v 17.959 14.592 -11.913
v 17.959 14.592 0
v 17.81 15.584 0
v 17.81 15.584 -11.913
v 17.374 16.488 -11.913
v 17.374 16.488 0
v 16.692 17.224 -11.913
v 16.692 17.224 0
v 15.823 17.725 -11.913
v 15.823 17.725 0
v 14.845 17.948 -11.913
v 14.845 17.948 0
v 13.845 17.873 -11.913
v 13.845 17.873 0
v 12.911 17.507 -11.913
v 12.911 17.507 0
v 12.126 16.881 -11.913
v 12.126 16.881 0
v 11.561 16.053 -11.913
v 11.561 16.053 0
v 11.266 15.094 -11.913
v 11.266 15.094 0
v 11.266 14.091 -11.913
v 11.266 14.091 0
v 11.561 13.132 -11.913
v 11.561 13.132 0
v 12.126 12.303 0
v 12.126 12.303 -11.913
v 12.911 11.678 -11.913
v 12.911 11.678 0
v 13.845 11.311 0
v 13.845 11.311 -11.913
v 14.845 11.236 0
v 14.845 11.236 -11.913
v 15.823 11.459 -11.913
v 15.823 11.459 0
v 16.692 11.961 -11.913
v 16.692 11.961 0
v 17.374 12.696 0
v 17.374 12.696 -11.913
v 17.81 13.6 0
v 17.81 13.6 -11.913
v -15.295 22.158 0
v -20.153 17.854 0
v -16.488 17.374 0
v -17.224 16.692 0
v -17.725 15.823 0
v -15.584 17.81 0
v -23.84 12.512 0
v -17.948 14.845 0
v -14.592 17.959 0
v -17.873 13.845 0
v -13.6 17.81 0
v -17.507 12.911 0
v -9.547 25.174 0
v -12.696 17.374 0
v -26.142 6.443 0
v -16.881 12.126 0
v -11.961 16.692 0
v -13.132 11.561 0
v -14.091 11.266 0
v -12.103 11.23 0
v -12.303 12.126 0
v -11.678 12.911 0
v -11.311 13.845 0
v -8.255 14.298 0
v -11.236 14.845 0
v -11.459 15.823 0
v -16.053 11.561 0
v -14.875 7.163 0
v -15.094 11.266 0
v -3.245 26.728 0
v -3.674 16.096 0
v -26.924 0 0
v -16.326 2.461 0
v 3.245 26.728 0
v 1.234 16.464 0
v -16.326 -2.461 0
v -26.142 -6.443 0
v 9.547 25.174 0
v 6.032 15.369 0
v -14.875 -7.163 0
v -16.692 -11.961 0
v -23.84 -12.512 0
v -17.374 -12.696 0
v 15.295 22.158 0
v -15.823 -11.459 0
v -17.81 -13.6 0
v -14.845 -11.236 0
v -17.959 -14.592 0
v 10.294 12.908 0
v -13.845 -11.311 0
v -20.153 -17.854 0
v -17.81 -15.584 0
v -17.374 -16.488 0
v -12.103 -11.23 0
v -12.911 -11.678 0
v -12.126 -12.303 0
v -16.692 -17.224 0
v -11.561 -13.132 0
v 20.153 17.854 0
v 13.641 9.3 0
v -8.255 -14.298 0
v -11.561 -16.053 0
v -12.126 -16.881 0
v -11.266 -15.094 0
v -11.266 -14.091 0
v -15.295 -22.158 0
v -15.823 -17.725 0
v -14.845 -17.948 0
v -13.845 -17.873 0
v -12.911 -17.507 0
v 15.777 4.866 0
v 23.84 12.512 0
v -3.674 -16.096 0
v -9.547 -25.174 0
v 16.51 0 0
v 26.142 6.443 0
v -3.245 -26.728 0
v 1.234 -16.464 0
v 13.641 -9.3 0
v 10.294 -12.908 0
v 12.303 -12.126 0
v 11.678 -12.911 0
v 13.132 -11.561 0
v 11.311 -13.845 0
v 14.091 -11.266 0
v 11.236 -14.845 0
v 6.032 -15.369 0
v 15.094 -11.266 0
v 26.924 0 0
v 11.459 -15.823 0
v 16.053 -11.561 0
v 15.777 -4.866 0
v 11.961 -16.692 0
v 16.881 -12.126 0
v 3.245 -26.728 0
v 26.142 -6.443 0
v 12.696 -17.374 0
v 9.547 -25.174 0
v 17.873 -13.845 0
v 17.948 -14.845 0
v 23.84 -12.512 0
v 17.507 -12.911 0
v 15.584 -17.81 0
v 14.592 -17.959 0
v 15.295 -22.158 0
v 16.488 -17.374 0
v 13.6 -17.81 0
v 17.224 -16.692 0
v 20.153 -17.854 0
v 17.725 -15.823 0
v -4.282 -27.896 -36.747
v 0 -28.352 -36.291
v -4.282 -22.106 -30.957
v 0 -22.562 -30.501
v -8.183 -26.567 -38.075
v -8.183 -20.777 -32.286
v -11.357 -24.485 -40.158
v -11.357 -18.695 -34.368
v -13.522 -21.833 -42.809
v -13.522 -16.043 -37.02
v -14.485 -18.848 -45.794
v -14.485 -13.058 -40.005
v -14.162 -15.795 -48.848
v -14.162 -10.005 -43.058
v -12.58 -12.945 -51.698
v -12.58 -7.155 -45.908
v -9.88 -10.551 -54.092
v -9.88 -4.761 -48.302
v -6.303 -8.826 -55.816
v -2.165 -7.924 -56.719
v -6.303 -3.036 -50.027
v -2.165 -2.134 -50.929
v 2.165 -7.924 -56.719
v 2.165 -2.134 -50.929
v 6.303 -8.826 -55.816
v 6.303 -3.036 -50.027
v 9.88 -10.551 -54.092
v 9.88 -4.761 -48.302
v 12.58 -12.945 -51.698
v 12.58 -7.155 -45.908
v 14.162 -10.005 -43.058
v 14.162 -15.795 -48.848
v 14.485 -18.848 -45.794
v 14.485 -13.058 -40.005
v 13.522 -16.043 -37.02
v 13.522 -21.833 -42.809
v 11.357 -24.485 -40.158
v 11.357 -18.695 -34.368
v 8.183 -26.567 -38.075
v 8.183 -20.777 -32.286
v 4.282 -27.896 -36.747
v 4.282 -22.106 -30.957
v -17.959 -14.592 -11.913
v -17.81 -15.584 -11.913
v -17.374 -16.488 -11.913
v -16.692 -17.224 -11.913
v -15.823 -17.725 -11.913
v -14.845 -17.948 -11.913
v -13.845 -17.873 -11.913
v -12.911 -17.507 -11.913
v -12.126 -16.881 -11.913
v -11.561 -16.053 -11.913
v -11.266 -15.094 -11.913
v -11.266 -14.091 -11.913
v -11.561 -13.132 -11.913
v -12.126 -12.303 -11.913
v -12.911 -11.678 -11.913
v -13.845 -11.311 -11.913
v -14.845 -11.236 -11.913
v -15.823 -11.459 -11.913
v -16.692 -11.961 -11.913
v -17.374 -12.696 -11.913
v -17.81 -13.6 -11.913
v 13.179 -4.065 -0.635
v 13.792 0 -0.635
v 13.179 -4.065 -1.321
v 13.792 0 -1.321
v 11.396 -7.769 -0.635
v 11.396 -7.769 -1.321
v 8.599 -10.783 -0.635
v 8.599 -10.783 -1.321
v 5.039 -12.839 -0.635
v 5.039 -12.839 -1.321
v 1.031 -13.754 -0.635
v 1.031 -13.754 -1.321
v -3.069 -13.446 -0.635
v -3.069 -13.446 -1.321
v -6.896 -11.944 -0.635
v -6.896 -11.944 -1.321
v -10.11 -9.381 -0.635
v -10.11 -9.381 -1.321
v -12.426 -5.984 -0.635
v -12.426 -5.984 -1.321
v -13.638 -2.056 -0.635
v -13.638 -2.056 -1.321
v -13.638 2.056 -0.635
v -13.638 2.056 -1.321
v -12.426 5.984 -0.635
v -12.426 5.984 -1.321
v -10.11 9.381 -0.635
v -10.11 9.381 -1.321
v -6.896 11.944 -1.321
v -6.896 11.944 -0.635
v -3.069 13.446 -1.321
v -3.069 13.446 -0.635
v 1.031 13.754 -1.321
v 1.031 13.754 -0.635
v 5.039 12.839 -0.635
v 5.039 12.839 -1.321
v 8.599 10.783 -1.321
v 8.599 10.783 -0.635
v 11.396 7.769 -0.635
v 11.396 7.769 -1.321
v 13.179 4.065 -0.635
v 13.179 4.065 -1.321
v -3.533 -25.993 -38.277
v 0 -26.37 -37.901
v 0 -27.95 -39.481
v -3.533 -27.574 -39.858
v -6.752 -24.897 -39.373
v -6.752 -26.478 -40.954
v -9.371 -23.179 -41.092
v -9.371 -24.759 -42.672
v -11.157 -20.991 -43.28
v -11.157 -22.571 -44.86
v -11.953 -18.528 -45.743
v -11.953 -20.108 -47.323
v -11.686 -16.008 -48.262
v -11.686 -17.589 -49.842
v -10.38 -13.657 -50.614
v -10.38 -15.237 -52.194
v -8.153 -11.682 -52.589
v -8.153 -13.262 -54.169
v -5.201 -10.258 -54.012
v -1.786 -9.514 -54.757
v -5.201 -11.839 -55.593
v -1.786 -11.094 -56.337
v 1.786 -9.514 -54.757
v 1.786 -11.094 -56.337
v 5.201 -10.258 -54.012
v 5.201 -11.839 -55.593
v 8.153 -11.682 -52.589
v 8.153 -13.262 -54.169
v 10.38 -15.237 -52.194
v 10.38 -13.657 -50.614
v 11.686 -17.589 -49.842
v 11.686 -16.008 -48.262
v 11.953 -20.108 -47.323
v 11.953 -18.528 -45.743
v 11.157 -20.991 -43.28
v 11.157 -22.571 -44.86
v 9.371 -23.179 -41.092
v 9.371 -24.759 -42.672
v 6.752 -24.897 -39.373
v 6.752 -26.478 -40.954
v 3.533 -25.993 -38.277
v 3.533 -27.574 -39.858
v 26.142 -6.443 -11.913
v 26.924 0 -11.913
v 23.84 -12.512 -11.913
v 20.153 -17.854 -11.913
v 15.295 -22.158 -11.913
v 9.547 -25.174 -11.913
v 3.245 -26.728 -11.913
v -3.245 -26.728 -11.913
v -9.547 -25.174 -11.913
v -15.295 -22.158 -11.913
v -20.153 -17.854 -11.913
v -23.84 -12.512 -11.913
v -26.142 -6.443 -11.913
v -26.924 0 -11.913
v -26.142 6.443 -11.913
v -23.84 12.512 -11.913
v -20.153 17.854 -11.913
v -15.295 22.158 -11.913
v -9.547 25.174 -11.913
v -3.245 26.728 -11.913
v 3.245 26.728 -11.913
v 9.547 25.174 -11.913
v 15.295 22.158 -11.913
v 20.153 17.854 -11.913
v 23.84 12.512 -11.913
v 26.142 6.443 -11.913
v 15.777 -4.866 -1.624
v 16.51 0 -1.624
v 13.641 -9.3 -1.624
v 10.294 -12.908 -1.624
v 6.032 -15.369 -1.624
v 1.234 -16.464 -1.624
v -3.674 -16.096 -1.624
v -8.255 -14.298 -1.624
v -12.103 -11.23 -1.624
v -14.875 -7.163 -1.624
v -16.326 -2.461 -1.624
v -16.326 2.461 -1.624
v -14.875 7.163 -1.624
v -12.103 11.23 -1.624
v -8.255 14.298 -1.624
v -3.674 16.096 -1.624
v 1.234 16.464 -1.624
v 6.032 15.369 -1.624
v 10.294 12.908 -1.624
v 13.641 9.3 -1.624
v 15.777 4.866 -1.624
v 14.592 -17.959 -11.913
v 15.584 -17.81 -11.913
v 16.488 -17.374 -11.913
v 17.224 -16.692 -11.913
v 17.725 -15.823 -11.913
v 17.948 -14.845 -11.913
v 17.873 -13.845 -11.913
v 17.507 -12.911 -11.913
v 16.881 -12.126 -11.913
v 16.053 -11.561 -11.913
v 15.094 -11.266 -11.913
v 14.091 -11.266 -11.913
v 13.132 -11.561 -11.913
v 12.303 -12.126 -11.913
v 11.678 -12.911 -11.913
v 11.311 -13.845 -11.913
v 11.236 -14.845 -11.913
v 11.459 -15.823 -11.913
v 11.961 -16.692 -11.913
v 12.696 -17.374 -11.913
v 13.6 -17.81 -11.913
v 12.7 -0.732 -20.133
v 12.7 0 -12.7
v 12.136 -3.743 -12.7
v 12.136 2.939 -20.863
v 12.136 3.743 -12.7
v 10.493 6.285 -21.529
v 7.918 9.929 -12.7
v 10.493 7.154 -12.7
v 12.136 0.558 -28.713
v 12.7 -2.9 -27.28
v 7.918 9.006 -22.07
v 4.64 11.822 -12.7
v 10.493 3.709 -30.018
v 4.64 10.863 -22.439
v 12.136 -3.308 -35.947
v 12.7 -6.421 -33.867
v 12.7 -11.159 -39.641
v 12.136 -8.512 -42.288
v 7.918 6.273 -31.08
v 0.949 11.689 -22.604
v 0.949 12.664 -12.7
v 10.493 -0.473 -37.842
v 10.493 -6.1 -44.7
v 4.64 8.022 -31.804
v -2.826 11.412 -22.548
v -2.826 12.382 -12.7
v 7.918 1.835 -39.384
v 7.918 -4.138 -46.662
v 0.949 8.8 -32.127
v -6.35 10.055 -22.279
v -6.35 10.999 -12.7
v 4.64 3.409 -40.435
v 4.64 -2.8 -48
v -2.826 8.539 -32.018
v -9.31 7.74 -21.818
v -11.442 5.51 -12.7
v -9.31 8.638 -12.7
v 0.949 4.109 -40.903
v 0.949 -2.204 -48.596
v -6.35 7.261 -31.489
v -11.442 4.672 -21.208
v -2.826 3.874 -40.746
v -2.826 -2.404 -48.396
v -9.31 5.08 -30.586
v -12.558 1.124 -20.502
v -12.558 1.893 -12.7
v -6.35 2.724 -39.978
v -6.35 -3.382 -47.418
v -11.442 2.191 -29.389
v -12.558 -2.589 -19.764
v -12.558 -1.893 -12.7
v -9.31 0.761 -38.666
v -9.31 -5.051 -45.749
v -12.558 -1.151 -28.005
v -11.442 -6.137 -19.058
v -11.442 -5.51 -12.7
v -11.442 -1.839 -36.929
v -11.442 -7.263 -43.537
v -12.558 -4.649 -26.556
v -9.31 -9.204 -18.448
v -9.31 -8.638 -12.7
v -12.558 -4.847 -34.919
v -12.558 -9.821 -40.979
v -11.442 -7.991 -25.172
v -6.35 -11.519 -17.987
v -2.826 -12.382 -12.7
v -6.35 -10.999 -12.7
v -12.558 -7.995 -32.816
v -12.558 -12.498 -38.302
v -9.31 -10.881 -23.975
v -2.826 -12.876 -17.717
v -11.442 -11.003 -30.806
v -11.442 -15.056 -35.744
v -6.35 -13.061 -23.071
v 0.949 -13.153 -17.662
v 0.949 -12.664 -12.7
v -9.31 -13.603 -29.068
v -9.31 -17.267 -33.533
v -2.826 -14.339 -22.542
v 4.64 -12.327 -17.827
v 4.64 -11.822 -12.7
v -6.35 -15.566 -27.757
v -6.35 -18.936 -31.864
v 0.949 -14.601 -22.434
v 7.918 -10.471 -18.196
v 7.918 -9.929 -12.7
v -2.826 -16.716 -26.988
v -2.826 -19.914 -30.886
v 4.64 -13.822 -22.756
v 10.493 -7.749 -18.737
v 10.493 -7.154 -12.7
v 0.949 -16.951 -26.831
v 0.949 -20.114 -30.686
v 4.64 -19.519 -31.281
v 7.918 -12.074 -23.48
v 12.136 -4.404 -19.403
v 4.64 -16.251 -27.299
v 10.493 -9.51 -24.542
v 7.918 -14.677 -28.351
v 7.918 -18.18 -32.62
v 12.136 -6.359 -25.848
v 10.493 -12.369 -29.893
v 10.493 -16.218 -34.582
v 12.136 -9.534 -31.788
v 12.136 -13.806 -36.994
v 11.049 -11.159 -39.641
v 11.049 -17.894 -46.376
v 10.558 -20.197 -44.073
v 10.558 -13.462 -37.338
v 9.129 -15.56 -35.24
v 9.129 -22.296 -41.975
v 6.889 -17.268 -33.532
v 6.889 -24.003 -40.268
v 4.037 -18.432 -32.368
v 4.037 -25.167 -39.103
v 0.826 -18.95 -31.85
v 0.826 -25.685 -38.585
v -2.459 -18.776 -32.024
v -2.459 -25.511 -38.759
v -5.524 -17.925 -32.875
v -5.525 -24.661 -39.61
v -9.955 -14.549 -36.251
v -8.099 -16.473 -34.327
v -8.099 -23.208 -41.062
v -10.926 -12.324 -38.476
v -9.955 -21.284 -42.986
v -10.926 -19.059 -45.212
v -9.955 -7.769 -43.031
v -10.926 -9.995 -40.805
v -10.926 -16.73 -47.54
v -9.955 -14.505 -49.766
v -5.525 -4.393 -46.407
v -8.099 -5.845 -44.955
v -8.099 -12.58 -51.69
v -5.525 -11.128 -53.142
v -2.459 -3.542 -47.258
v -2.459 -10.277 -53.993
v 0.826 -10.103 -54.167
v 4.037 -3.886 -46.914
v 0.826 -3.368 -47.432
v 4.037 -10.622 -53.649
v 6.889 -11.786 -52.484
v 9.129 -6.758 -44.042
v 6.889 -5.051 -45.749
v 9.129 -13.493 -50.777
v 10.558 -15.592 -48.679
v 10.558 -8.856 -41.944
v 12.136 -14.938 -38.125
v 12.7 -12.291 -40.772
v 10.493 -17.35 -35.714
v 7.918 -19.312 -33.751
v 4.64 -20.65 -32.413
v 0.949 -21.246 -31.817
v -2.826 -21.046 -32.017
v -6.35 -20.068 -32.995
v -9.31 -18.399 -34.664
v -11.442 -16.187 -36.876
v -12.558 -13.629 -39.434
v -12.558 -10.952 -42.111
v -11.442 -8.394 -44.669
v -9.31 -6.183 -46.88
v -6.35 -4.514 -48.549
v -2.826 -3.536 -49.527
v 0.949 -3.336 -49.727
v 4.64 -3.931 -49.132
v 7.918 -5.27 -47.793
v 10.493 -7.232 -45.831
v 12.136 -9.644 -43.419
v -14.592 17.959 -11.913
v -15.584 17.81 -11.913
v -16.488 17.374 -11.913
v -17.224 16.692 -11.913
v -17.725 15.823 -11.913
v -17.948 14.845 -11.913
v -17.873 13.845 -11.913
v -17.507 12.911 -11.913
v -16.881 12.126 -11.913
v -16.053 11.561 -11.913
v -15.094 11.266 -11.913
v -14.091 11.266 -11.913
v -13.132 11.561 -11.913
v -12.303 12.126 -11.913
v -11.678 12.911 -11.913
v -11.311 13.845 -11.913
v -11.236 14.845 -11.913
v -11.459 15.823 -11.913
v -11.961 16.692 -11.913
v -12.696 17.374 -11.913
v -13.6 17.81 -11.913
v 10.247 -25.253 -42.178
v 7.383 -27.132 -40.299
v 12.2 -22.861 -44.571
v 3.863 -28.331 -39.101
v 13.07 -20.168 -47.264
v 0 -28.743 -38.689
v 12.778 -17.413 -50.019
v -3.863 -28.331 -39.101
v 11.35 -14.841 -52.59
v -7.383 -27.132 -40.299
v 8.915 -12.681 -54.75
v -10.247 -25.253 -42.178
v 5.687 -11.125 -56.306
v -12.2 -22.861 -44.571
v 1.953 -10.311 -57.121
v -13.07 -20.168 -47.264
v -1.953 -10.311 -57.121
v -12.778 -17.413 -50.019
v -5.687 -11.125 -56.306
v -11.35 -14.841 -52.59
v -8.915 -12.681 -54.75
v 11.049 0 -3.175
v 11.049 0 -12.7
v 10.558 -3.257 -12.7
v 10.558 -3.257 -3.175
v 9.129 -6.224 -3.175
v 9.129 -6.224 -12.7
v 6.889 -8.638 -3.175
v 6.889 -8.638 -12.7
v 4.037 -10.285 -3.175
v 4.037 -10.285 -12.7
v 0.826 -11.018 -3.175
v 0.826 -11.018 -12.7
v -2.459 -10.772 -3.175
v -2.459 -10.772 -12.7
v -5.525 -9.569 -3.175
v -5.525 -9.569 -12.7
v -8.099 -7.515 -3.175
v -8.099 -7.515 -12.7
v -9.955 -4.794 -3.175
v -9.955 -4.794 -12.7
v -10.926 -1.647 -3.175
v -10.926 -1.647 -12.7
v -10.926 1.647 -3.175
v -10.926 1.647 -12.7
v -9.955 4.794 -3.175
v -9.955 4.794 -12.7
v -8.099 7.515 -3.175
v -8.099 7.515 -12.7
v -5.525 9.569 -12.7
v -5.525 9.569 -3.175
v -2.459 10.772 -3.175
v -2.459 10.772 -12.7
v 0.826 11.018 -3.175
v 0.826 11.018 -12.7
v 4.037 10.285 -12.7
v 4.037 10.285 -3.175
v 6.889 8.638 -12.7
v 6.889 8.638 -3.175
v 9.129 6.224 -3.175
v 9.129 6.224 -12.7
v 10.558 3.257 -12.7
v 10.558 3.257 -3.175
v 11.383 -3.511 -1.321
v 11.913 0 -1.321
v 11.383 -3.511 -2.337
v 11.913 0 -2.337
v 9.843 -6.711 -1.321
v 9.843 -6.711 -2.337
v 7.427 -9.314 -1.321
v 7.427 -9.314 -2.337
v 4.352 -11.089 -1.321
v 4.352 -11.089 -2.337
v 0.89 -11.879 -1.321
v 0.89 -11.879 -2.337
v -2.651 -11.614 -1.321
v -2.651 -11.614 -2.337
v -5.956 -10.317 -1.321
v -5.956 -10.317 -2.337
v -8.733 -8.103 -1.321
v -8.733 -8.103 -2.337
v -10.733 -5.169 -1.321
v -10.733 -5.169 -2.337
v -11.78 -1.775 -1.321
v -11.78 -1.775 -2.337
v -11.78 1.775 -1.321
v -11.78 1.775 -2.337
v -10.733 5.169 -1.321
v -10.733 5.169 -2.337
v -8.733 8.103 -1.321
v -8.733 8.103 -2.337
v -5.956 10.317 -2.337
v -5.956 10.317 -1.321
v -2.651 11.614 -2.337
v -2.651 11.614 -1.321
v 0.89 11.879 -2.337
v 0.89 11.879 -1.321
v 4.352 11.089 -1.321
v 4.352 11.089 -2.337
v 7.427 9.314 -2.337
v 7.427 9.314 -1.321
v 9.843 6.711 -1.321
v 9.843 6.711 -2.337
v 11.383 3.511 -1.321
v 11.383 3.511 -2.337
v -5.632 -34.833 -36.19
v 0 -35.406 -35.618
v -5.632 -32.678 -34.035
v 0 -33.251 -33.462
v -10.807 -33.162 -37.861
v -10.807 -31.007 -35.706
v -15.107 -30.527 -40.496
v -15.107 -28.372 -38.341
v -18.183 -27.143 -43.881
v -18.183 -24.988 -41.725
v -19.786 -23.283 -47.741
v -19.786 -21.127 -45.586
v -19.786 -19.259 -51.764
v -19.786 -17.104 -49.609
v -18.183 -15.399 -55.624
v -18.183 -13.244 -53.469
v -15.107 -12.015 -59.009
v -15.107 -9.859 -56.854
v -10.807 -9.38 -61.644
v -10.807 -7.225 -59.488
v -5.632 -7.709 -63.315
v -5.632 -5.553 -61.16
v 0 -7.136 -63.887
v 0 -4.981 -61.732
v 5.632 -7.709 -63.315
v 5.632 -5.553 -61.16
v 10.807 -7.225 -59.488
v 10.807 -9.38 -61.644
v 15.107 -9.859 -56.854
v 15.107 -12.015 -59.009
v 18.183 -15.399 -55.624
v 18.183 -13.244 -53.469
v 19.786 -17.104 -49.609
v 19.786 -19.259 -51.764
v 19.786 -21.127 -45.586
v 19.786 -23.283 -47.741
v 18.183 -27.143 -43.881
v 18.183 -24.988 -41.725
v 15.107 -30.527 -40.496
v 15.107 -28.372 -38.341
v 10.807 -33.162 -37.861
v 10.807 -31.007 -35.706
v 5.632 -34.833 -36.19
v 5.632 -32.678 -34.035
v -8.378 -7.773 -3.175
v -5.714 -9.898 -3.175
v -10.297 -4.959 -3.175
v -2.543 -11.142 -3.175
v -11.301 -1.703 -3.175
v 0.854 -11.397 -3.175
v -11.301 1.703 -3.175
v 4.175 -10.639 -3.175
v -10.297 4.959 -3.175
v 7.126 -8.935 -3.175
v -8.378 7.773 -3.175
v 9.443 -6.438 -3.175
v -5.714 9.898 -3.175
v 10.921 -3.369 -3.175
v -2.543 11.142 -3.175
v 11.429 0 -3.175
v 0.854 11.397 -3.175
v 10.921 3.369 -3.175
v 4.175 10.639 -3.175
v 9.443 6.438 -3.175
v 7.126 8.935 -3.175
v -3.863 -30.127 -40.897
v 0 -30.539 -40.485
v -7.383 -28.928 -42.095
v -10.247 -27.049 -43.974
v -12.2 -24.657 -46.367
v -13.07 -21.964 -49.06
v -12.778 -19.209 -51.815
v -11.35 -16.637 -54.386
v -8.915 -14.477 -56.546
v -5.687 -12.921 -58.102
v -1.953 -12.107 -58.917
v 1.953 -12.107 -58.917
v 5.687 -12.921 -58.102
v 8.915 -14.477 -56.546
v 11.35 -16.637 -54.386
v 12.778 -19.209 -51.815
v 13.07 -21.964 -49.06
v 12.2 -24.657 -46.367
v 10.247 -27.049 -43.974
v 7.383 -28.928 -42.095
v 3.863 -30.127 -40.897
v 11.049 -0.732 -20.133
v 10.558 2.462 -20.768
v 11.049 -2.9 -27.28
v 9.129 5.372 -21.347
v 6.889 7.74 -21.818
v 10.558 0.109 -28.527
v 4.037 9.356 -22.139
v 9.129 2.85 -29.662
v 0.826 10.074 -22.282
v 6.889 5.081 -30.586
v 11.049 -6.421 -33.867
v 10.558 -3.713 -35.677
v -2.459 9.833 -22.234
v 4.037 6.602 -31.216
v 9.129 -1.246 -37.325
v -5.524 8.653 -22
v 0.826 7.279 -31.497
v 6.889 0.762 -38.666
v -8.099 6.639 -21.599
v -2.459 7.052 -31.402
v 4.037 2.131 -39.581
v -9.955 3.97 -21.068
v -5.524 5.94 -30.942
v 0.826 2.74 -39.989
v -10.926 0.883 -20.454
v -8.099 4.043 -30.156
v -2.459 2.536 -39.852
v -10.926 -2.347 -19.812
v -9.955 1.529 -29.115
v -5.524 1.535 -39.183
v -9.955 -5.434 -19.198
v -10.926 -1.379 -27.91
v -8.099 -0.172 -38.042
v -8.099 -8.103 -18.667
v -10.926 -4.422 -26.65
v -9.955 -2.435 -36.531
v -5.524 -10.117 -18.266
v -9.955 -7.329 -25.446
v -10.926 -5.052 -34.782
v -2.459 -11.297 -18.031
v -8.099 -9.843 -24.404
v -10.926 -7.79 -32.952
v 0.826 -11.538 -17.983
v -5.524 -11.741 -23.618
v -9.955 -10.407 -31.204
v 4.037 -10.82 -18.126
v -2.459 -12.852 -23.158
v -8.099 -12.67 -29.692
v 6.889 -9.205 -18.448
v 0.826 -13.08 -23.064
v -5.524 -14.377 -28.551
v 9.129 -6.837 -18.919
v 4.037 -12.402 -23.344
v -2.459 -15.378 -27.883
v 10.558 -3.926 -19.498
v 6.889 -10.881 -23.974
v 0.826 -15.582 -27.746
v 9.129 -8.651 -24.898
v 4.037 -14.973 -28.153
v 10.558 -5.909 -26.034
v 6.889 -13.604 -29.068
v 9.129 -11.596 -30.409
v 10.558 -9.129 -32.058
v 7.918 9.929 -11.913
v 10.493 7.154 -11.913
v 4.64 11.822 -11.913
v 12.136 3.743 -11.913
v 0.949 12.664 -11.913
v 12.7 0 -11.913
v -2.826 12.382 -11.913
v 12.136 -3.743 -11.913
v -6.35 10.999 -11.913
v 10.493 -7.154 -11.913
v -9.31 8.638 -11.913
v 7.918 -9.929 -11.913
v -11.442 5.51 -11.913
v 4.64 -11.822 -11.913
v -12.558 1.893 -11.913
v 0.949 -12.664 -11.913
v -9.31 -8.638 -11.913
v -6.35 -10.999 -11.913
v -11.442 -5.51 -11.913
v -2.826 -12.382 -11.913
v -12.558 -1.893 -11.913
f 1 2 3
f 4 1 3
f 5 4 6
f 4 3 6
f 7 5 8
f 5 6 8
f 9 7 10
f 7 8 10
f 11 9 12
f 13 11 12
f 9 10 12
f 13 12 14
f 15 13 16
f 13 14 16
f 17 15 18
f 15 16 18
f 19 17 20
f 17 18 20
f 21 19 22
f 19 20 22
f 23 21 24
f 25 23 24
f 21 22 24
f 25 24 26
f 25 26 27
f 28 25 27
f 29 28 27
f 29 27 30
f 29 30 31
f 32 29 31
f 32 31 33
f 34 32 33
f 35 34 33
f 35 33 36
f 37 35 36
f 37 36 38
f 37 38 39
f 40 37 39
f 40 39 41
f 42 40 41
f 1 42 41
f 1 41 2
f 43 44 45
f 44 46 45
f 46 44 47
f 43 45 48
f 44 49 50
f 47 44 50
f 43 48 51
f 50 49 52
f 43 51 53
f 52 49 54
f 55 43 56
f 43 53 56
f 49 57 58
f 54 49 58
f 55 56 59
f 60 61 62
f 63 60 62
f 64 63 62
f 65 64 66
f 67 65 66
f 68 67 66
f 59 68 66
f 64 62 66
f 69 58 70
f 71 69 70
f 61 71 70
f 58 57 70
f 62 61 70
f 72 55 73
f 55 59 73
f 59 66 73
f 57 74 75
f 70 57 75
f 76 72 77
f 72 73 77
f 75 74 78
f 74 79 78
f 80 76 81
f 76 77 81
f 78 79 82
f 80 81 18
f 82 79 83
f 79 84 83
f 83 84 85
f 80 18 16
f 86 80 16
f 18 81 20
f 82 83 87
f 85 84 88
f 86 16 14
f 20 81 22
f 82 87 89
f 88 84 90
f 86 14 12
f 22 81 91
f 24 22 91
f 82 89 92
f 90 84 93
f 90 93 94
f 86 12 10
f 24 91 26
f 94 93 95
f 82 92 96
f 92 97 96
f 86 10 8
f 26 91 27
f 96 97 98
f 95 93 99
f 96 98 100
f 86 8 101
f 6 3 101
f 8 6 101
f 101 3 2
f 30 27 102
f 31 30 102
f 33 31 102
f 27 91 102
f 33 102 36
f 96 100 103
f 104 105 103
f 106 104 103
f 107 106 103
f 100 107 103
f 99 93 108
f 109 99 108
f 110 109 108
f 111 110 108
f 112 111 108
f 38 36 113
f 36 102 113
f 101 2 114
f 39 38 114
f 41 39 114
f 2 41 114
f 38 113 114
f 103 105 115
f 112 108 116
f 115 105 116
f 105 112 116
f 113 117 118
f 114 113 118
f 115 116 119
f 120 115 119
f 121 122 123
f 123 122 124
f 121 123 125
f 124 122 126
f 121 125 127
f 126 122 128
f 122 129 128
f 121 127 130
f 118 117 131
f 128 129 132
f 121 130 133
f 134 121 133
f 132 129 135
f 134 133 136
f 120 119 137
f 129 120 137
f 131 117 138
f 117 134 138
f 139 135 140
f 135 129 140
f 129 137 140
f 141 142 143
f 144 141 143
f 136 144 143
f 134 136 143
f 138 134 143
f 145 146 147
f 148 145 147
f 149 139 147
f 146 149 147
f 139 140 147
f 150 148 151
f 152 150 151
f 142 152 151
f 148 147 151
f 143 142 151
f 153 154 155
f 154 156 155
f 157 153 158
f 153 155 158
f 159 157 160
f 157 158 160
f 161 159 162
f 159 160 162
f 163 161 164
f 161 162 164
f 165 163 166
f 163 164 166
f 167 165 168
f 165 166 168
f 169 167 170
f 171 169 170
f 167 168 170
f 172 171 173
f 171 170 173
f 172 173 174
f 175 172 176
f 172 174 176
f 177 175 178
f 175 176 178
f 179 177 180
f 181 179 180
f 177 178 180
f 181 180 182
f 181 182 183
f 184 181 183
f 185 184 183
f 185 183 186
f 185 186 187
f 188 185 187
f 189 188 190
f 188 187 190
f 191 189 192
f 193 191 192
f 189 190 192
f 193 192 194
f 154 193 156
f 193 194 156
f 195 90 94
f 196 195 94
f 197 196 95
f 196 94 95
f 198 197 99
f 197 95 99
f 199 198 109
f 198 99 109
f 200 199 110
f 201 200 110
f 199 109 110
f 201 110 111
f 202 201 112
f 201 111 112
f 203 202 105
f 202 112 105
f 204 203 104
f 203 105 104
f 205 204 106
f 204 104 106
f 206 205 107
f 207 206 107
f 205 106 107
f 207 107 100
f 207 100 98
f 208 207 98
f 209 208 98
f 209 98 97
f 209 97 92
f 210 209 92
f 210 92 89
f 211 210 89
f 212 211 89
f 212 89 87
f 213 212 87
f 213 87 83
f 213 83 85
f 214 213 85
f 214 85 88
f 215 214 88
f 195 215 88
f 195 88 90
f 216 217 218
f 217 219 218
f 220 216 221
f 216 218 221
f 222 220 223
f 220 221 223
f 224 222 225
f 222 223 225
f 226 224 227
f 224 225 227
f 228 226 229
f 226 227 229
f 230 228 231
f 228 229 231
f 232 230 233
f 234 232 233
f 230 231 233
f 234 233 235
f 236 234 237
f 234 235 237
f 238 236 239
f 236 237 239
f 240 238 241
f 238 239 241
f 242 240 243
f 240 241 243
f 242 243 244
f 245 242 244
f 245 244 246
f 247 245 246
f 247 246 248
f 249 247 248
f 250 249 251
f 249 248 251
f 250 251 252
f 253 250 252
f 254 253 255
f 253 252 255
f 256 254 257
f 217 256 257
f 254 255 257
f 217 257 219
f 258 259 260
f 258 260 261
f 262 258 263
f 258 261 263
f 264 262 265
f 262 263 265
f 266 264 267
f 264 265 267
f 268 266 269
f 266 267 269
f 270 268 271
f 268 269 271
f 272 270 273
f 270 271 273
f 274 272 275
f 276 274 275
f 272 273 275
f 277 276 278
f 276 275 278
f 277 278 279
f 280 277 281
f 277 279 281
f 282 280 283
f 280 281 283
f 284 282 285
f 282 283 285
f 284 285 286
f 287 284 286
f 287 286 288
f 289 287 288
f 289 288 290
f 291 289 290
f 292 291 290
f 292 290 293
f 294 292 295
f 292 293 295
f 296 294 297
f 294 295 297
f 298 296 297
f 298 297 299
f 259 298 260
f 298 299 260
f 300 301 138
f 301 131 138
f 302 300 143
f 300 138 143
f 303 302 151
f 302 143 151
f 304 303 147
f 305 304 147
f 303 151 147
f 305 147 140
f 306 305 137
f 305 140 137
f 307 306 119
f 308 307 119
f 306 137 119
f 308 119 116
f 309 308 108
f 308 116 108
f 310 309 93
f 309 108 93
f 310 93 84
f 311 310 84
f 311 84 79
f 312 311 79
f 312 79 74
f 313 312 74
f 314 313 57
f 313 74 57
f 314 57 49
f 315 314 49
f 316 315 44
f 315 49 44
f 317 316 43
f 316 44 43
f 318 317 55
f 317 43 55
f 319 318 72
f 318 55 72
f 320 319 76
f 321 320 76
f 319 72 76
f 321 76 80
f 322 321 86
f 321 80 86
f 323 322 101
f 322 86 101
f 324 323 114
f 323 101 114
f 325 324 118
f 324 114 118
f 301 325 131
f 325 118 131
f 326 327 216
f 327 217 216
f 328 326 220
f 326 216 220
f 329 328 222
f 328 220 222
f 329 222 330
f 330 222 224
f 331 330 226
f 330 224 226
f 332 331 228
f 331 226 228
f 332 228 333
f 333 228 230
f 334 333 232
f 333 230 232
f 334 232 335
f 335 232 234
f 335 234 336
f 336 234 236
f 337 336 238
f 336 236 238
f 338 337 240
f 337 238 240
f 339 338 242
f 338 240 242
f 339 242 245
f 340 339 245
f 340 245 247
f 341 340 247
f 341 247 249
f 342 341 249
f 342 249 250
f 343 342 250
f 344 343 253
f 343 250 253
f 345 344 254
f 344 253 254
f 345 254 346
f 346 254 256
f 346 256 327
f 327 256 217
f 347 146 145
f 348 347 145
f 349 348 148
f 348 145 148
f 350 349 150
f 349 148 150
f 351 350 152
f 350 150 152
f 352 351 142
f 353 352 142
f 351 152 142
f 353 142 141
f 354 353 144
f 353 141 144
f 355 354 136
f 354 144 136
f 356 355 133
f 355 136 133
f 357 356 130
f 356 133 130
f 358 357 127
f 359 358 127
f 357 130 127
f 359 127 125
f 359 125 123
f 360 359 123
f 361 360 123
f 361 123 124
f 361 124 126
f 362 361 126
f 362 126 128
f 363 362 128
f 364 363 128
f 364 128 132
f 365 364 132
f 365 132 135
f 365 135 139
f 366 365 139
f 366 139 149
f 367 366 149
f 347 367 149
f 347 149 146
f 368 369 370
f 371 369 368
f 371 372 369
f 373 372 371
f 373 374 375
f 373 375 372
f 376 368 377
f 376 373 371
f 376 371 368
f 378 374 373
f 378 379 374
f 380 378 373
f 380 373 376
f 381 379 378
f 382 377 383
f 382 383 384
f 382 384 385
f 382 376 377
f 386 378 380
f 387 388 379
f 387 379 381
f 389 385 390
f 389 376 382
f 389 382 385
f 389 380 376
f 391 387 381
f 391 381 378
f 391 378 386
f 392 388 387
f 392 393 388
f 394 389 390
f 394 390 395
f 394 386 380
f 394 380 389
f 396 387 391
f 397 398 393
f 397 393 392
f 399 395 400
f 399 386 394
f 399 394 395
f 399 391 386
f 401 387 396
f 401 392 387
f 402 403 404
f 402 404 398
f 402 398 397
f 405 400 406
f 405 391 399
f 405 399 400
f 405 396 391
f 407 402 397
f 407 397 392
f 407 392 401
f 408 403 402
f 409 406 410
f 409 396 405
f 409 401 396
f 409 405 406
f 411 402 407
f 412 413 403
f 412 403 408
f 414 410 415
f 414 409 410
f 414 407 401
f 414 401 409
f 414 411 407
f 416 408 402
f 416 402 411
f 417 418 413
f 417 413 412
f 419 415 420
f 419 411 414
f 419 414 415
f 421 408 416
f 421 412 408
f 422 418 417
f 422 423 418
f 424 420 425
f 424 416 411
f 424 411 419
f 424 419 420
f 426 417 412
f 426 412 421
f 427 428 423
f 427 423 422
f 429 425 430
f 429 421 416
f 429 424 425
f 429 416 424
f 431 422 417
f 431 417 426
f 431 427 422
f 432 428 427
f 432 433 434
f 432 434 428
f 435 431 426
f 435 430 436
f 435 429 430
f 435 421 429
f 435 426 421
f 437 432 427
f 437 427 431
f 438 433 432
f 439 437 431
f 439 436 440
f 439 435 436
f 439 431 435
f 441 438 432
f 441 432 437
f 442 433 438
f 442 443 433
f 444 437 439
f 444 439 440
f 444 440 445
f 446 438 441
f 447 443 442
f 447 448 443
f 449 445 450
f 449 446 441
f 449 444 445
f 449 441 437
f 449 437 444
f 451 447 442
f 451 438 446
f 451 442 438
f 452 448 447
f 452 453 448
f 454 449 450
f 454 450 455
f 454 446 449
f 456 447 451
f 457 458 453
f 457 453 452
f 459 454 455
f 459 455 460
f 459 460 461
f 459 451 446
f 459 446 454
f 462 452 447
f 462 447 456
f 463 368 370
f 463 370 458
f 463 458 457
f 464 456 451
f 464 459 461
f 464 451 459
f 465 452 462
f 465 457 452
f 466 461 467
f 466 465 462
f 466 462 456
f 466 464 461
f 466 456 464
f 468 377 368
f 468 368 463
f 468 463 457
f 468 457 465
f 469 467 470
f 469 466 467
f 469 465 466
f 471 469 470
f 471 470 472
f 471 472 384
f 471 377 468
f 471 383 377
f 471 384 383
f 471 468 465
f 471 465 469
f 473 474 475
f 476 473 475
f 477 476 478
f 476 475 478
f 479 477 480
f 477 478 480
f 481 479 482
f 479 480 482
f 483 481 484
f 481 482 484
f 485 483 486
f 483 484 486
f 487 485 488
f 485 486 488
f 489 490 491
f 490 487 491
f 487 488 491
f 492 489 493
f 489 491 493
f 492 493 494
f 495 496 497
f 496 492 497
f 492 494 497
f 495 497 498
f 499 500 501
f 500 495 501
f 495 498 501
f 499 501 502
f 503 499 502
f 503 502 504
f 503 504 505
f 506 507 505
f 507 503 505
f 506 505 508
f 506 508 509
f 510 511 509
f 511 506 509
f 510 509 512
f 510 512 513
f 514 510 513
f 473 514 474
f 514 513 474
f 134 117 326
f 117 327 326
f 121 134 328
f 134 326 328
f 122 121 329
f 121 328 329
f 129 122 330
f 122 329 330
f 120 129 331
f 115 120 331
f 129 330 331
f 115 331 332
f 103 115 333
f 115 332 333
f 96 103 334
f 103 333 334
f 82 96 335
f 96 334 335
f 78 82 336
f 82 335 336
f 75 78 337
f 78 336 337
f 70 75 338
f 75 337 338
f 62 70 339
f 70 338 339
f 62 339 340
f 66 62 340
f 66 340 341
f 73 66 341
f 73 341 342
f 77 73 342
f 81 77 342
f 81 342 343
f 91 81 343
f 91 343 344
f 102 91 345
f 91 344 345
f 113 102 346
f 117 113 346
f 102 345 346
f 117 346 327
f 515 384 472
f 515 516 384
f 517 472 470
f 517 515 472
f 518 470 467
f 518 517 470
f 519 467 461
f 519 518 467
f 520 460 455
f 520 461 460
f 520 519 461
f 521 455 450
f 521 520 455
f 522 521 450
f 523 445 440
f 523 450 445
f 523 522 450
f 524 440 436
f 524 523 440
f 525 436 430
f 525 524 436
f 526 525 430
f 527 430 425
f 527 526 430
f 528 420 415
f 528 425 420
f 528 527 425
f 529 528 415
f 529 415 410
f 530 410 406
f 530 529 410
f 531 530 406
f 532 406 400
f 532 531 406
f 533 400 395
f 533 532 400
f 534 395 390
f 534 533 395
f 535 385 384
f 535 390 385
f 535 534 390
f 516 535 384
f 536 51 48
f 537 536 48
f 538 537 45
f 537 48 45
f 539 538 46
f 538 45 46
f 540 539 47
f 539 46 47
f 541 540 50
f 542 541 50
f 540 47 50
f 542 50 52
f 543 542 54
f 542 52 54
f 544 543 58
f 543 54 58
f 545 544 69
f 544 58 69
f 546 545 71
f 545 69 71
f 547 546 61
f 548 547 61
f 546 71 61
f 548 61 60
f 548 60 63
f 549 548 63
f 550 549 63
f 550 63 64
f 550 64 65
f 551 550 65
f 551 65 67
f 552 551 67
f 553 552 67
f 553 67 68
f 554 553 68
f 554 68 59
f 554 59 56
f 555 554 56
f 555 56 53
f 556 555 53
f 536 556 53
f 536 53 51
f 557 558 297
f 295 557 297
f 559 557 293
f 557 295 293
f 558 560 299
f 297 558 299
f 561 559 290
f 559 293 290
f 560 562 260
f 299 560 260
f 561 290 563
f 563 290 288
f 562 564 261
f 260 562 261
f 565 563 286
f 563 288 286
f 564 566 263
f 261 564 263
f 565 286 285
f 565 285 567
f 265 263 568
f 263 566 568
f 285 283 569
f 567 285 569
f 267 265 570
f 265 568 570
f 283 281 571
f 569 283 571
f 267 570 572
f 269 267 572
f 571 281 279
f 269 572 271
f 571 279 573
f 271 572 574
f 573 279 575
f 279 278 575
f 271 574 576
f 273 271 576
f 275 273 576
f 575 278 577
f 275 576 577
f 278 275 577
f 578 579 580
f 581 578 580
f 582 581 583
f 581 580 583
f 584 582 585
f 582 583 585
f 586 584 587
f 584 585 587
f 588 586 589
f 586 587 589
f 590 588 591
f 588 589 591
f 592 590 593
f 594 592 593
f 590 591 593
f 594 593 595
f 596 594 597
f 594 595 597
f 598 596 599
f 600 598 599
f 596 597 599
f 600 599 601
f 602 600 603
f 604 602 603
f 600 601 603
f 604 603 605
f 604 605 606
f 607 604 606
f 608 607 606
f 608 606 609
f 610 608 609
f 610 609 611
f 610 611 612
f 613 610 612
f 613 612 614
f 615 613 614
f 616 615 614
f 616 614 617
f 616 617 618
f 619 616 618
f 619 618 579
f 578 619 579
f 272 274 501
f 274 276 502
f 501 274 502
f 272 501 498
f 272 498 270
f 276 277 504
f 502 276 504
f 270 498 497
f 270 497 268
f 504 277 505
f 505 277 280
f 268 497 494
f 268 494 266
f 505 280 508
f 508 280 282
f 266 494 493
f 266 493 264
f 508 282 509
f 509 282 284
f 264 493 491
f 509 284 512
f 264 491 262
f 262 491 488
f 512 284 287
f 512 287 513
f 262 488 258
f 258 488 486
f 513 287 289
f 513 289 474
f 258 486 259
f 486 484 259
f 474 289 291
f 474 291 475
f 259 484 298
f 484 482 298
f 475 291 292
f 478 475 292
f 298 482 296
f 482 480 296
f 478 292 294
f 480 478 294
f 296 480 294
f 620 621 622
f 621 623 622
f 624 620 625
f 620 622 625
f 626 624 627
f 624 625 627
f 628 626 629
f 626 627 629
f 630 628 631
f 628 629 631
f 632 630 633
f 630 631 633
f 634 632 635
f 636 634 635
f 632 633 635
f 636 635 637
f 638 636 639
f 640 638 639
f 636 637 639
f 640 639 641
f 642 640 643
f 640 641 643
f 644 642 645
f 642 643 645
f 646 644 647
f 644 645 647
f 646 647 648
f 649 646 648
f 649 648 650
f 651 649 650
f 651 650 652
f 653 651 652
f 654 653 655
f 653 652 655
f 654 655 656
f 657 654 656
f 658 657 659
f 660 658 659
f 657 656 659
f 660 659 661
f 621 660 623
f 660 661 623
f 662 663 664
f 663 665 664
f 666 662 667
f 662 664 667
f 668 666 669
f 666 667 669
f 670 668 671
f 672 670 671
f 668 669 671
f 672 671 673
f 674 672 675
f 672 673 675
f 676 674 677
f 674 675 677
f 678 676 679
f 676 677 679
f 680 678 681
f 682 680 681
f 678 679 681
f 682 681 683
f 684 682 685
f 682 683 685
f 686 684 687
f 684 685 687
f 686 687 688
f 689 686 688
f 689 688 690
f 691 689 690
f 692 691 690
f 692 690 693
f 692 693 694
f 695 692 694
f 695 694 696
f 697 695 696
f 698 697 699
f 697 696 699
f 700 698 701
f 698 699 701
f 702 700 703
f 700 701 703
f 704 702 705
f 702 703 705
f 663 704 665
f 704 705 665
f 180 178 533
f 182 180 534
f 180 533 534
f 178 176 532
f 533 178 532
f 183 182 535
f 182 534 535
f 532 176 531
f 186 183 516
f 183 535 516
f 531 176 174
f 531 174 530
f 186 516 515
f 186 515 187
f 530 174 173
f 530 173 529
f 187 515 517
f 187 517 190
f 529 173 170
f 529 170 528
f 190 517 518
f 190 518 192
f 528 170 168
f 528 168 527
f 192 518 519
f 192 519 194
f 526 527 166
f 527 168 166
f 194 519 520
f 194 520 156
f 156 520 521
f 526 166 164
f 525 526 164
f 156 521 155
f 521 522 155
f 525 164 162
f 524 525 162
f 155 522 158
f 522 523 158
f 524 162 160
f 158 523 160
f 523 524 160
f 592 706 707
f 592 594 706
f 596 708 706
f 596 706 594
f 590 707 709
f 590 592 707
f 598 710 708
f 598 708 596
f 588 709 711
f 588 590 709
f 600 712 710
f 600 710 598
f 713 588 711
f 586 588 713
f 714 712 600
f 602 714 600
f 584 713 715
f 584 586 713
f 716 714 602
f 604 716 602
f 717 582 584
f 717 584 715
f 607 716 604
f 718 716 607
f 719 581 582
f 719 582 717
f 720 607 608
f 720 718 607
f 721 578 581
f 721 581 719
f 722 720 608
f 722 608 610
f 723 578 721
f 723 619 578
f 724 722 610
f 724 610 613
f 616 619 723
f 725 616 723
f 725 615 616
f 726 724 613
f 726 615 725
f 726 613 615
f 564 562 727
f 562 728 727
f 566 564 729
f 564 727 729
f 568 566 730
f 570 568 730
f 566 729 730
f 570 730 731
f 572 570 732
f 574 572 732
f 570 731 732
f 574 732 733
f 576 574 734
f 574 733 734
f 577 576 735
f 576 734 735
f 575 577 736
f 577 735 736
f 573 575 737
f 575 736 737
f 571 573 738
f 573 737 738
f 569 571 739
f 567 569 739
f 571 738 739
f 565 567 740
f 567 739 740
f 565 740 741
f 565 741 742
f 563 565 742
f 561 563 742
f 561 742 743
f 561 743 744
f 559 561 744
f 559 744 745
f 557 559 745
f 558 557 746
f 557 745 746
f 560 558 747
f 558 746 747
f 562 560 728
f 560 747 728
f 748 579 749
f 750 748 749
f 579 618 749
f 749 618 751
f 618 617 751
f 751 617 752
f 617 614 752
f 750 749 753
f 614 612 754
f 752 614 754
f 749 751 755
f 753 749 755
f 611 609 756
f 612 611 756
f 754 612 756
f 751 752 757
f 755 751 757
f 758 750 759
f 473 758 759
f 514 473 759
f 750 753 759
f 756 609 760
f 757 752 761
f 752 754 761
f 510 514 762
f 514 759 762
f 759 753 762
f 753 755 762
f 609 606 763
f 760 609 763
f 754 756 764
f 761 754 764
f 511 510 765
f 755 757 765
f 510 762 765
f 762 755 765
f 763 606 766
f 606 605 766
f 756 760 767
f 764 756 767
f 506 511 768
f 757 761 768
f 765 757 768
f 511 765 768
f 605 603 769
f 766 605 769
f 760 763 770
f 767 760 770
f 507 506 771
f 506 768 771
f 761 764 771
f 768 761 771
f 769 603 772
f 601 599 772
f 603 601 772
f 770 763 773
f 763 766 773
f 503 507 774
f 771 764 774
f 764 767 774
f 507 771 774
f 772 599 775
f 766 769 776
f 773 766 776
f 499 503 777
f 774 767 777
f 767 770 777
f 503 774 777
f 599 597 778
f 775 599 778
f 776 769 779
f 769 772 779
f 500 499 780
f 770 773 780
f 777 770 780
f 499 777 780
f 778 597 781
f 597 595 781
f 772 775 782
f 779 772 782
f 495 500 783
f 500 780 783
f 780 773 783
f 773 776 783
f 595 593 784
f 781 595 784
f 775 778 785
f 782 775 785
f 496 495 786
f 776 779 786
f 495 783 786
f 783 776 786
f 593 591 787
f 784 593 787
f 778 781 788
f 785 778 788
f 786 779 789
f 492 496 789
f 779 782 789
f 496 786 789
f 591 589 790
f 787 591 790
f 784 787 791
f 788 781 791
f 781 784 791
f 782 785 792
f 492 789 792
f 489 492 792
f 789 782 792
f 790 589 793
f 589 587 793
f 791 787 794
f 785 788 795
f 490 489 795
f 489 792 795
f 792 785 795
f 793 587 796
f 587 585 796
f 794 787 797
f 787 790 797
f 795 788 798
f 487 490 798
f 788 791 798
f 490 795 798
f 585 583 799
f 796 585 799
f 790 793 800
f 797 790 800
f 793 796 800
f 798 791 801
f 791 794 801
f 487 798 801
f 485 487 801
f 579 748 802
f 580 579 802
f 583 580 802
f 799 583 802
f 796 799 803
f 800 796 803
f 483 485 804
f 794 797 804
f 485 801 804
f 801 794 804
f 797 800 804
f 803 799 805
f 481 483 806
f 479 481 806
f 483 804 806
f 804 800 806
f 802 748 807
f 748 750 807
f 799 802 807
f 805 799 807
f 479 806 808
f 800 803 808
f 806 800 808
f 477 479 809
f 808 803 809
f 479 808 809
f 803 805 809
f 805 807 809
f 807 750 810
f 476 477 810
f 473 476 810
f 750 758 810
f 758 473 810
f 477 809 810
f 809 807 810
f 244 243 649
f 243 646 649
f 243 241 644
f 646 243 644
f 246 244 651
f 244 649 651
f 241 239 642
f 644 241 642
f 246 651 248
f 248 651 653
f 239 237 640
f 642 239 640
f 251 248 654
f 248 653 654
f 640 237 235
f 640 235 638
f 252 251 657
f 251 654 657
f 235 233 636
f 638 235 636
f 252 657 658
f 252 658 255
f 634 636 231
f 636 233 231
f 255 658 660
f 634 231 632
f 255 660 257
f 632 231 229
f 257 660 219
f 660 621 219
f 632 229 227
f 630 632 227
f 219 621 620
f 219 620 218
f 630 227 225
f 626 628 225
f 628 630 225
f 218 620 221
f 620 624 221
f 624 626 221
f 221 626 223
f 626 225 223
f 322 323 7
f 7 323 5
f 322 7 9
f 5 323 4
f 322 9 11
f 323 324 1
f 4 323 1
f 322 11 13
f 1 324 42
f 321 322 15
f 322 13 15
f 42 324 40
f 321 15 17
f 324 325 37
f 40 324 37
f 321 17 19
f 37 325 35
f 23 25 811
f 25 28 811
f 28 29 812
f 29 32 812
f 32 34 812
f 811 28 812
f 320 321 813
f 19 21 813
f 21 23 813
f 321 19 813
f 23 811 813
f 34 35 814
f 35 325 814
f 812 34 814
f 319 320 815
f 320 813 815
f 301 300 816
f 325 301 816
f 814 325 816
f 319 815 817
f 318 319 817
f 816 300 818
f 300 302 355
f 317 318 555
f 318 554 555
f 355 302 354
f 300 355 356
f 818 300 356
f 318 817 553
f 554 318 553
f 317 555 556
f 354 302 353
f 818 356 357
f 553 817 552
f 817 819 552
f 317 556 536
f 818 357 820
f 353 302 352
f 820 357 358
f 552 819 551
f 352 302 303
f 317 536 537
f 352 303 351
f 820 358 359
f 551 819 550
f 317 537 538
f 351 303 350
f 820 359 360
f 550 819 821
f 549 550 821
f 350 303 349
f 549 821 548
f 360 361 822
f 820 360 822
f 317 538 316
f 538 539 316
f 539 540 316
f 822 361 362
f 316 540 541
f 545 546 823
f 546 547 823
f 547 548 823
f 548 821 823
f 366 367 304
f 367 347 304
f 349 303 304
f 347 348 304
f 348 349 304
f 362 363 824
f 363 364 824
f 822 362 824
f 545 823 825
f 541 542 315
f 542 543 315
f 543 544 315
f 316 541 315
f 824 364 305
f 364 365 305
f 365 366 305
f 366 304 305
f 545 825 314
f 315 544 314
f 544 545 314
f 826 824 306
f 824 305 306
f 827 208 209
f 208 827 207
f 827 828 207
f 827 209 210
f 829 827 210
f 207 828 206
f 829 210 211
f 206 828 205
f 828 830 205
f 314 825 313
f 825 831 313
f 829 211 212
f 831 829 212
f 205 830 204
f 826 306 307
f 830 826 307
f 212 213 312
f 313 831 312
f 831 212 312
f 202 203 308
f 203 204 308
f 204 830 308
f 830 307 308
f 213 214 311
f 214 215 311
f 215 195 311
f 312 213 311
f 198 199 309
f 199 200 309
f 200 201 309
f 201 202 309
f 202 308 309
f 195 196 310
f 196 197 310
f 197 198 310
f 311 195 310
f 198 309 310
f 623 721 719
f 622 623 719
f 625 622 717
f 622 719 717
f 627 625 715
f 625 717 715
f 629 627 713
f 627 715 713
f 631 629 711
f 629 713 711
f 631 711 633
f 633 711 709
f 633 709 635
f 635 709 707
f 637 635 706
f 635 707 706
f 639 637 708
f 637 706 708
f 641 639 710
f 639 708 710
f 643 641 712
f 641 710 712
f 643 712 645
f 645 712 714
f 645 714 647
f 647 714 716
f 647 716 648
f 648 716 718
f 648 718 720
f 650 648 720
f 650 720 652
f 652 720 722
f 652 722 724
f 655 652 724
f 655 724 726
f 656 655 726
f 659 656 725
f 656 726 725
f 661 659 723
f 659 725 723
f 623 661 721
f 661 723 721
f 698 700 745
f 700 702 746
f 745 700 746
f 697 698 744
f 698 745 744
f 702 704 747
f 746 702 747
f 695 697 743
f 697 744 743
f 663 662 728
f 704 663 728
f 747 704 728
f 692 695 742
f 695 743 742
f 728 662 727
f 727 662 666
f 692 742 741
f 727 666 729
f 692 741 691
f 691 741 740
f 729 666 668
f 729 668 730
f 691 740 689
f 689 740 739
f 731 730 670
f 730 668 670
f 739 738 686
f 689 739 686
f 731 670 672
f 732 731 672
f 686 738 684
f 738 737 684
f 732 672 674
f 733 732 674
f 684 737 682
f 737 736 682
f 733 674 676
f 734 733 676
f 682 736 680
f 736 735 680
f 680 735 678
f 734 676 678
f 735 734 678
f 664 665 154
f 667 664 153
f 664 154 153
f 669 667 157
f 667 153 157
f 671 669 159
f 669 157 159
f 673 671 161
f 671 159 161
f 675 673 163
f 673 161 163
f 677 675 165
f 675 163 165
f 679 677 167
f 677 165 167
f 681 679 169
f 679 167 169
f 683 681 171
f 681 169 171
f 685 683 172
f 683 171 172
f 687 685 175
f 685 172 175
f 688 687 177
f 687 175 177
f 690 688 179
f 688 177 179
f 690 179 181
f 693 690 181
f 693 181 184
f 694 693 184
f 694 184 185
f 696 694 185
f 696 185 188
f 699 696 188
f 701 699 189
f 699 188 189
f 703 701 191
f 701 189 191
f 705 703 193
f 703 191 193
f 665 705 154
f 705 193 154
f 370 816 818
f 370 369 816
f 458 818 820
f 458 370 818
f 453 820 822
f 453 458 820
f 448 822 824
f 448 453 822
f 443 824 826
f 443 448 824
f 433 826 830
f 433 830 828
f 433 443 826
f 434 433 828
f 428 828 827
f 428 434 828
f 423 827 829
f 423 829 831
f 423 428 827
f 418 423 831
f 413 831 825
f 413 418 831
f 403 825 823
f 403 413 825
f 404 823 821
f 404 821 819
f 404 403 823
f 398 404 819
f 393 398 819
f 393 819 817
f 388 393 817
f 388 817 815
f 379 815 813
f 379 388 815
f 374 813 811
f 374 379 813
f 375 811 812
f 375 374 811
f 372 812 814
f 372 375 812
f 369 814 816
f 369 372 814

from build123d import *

# Parameters (mm, degrees)
SKETCH3_R          = 3.3655
CUT_EXTRUDE2_DEPTH = 40.896285426
CIRPATTERN1_COUNT  = 4
SKETCH6_R          = 12.7
SKETCH6_R_2        = 11.049


with BuildPart() as part:
    # Sketch1 → Revolve1 (revolve)
    with BuildSketch(Plane(origin=(0, 0, 0), x_dir=(0, 0, -1), z_dir=(1, 0, 0)), mode=Mode.PRIVATE) as revolve1_sk:
        Polygon((0, 26.924), (0, 16.51), (1.624198303, 16.51), (0.635, 13.7922), (1.3208, 13.7922), (1.3208, 11.9126), (2.3368, 11.9126), (3.722613851, 11.1125), (11.9126, 11.1125), (11.9126, 26.924), align=None)
    revolve(revolve1_sk.sketch.rotate(Axis((0, 0, 0), (0, 0, -1)), 90), axis=Axis((0, 0, 0), (0, 0, -1)))

    # Sketch3 → Cut-Extrude2 (cut, through all)
    with BuildSketch(Plane.XY):
        with Locations((14.593532367, 14.5923)):
            Circle(SKETCH3_R)
    cut_extrude2 = extrude(amount=-CUT_EXTRUDE2_DEPTH, mode=Mode.SUBTRACT)

    # CirPattern1: Cut-Extrude2 ×4 about axis
    cirpattern1_axis = Axis((0, 0, 0), (0, 0, 1))
    for i in range(1, CIRPATTERN1_COUNT):
        add(cut_extrude2.rotate(cirpattern1_axis, i * 360 / CIRPATTERN1_COUNT), mode=Mode.SUBTRACT)

    # Sweep2: sweep along a path in Sketch5
    with BuildLine(Plane(origin=(0, 0, 0), x_dir=(0, 0, -1), z_dir=(1, 0, 0))) as sweep2_path:
        Line((3.175, 0), (12.7, 0))
        ThreePointArc((12.7, 0), (27.280238773, -2.900189811), (39.640768363, -11.159231637))
        Line((39.640768363, -11.159231637), (46.375960454, -17.894423728))
    # Sketch6 → Sweep2 (sweep)
    with BuildSketch(Plane.XY.offset(-3.175)):
        Circle(SKETCH6_R)
        Circle(SKETCH6_R_2, mode=Mode.SUBTRACT)
    sweep(path=sweep2_path.line)

    # Sketch7 → Revolve2 (revolve)
    with BuildSketch(Plane(origin=(0, 0, 0), x_dir=(0, 0, -1), z_dir=(1, 0, 0)), mode=Mode.PRIVATE) as revolve2_sk:
        Polygon((56.431890618, -10.999543718), (57.224109848, -10.207324488), (59.020161072, -12.003375712), (63.88745989, -7.136076895), (61.732198421, -4.980815425), (56.833518782, -7.809069434), (51.043736945, -2.019287597), (49.247685721, -3.815338821), align=None)
    revolve(revolve2_sk.sketch.rotate(Axis((0, -17.894423728, -46.375960454), (0, -0.7071067811865475, -0.7071067811865476)), 180), axis=Axis((0, -17.894423728, -46.375960454), (0, -0.7071067811865475, -0.7071067811865476)))


solid = part.part
